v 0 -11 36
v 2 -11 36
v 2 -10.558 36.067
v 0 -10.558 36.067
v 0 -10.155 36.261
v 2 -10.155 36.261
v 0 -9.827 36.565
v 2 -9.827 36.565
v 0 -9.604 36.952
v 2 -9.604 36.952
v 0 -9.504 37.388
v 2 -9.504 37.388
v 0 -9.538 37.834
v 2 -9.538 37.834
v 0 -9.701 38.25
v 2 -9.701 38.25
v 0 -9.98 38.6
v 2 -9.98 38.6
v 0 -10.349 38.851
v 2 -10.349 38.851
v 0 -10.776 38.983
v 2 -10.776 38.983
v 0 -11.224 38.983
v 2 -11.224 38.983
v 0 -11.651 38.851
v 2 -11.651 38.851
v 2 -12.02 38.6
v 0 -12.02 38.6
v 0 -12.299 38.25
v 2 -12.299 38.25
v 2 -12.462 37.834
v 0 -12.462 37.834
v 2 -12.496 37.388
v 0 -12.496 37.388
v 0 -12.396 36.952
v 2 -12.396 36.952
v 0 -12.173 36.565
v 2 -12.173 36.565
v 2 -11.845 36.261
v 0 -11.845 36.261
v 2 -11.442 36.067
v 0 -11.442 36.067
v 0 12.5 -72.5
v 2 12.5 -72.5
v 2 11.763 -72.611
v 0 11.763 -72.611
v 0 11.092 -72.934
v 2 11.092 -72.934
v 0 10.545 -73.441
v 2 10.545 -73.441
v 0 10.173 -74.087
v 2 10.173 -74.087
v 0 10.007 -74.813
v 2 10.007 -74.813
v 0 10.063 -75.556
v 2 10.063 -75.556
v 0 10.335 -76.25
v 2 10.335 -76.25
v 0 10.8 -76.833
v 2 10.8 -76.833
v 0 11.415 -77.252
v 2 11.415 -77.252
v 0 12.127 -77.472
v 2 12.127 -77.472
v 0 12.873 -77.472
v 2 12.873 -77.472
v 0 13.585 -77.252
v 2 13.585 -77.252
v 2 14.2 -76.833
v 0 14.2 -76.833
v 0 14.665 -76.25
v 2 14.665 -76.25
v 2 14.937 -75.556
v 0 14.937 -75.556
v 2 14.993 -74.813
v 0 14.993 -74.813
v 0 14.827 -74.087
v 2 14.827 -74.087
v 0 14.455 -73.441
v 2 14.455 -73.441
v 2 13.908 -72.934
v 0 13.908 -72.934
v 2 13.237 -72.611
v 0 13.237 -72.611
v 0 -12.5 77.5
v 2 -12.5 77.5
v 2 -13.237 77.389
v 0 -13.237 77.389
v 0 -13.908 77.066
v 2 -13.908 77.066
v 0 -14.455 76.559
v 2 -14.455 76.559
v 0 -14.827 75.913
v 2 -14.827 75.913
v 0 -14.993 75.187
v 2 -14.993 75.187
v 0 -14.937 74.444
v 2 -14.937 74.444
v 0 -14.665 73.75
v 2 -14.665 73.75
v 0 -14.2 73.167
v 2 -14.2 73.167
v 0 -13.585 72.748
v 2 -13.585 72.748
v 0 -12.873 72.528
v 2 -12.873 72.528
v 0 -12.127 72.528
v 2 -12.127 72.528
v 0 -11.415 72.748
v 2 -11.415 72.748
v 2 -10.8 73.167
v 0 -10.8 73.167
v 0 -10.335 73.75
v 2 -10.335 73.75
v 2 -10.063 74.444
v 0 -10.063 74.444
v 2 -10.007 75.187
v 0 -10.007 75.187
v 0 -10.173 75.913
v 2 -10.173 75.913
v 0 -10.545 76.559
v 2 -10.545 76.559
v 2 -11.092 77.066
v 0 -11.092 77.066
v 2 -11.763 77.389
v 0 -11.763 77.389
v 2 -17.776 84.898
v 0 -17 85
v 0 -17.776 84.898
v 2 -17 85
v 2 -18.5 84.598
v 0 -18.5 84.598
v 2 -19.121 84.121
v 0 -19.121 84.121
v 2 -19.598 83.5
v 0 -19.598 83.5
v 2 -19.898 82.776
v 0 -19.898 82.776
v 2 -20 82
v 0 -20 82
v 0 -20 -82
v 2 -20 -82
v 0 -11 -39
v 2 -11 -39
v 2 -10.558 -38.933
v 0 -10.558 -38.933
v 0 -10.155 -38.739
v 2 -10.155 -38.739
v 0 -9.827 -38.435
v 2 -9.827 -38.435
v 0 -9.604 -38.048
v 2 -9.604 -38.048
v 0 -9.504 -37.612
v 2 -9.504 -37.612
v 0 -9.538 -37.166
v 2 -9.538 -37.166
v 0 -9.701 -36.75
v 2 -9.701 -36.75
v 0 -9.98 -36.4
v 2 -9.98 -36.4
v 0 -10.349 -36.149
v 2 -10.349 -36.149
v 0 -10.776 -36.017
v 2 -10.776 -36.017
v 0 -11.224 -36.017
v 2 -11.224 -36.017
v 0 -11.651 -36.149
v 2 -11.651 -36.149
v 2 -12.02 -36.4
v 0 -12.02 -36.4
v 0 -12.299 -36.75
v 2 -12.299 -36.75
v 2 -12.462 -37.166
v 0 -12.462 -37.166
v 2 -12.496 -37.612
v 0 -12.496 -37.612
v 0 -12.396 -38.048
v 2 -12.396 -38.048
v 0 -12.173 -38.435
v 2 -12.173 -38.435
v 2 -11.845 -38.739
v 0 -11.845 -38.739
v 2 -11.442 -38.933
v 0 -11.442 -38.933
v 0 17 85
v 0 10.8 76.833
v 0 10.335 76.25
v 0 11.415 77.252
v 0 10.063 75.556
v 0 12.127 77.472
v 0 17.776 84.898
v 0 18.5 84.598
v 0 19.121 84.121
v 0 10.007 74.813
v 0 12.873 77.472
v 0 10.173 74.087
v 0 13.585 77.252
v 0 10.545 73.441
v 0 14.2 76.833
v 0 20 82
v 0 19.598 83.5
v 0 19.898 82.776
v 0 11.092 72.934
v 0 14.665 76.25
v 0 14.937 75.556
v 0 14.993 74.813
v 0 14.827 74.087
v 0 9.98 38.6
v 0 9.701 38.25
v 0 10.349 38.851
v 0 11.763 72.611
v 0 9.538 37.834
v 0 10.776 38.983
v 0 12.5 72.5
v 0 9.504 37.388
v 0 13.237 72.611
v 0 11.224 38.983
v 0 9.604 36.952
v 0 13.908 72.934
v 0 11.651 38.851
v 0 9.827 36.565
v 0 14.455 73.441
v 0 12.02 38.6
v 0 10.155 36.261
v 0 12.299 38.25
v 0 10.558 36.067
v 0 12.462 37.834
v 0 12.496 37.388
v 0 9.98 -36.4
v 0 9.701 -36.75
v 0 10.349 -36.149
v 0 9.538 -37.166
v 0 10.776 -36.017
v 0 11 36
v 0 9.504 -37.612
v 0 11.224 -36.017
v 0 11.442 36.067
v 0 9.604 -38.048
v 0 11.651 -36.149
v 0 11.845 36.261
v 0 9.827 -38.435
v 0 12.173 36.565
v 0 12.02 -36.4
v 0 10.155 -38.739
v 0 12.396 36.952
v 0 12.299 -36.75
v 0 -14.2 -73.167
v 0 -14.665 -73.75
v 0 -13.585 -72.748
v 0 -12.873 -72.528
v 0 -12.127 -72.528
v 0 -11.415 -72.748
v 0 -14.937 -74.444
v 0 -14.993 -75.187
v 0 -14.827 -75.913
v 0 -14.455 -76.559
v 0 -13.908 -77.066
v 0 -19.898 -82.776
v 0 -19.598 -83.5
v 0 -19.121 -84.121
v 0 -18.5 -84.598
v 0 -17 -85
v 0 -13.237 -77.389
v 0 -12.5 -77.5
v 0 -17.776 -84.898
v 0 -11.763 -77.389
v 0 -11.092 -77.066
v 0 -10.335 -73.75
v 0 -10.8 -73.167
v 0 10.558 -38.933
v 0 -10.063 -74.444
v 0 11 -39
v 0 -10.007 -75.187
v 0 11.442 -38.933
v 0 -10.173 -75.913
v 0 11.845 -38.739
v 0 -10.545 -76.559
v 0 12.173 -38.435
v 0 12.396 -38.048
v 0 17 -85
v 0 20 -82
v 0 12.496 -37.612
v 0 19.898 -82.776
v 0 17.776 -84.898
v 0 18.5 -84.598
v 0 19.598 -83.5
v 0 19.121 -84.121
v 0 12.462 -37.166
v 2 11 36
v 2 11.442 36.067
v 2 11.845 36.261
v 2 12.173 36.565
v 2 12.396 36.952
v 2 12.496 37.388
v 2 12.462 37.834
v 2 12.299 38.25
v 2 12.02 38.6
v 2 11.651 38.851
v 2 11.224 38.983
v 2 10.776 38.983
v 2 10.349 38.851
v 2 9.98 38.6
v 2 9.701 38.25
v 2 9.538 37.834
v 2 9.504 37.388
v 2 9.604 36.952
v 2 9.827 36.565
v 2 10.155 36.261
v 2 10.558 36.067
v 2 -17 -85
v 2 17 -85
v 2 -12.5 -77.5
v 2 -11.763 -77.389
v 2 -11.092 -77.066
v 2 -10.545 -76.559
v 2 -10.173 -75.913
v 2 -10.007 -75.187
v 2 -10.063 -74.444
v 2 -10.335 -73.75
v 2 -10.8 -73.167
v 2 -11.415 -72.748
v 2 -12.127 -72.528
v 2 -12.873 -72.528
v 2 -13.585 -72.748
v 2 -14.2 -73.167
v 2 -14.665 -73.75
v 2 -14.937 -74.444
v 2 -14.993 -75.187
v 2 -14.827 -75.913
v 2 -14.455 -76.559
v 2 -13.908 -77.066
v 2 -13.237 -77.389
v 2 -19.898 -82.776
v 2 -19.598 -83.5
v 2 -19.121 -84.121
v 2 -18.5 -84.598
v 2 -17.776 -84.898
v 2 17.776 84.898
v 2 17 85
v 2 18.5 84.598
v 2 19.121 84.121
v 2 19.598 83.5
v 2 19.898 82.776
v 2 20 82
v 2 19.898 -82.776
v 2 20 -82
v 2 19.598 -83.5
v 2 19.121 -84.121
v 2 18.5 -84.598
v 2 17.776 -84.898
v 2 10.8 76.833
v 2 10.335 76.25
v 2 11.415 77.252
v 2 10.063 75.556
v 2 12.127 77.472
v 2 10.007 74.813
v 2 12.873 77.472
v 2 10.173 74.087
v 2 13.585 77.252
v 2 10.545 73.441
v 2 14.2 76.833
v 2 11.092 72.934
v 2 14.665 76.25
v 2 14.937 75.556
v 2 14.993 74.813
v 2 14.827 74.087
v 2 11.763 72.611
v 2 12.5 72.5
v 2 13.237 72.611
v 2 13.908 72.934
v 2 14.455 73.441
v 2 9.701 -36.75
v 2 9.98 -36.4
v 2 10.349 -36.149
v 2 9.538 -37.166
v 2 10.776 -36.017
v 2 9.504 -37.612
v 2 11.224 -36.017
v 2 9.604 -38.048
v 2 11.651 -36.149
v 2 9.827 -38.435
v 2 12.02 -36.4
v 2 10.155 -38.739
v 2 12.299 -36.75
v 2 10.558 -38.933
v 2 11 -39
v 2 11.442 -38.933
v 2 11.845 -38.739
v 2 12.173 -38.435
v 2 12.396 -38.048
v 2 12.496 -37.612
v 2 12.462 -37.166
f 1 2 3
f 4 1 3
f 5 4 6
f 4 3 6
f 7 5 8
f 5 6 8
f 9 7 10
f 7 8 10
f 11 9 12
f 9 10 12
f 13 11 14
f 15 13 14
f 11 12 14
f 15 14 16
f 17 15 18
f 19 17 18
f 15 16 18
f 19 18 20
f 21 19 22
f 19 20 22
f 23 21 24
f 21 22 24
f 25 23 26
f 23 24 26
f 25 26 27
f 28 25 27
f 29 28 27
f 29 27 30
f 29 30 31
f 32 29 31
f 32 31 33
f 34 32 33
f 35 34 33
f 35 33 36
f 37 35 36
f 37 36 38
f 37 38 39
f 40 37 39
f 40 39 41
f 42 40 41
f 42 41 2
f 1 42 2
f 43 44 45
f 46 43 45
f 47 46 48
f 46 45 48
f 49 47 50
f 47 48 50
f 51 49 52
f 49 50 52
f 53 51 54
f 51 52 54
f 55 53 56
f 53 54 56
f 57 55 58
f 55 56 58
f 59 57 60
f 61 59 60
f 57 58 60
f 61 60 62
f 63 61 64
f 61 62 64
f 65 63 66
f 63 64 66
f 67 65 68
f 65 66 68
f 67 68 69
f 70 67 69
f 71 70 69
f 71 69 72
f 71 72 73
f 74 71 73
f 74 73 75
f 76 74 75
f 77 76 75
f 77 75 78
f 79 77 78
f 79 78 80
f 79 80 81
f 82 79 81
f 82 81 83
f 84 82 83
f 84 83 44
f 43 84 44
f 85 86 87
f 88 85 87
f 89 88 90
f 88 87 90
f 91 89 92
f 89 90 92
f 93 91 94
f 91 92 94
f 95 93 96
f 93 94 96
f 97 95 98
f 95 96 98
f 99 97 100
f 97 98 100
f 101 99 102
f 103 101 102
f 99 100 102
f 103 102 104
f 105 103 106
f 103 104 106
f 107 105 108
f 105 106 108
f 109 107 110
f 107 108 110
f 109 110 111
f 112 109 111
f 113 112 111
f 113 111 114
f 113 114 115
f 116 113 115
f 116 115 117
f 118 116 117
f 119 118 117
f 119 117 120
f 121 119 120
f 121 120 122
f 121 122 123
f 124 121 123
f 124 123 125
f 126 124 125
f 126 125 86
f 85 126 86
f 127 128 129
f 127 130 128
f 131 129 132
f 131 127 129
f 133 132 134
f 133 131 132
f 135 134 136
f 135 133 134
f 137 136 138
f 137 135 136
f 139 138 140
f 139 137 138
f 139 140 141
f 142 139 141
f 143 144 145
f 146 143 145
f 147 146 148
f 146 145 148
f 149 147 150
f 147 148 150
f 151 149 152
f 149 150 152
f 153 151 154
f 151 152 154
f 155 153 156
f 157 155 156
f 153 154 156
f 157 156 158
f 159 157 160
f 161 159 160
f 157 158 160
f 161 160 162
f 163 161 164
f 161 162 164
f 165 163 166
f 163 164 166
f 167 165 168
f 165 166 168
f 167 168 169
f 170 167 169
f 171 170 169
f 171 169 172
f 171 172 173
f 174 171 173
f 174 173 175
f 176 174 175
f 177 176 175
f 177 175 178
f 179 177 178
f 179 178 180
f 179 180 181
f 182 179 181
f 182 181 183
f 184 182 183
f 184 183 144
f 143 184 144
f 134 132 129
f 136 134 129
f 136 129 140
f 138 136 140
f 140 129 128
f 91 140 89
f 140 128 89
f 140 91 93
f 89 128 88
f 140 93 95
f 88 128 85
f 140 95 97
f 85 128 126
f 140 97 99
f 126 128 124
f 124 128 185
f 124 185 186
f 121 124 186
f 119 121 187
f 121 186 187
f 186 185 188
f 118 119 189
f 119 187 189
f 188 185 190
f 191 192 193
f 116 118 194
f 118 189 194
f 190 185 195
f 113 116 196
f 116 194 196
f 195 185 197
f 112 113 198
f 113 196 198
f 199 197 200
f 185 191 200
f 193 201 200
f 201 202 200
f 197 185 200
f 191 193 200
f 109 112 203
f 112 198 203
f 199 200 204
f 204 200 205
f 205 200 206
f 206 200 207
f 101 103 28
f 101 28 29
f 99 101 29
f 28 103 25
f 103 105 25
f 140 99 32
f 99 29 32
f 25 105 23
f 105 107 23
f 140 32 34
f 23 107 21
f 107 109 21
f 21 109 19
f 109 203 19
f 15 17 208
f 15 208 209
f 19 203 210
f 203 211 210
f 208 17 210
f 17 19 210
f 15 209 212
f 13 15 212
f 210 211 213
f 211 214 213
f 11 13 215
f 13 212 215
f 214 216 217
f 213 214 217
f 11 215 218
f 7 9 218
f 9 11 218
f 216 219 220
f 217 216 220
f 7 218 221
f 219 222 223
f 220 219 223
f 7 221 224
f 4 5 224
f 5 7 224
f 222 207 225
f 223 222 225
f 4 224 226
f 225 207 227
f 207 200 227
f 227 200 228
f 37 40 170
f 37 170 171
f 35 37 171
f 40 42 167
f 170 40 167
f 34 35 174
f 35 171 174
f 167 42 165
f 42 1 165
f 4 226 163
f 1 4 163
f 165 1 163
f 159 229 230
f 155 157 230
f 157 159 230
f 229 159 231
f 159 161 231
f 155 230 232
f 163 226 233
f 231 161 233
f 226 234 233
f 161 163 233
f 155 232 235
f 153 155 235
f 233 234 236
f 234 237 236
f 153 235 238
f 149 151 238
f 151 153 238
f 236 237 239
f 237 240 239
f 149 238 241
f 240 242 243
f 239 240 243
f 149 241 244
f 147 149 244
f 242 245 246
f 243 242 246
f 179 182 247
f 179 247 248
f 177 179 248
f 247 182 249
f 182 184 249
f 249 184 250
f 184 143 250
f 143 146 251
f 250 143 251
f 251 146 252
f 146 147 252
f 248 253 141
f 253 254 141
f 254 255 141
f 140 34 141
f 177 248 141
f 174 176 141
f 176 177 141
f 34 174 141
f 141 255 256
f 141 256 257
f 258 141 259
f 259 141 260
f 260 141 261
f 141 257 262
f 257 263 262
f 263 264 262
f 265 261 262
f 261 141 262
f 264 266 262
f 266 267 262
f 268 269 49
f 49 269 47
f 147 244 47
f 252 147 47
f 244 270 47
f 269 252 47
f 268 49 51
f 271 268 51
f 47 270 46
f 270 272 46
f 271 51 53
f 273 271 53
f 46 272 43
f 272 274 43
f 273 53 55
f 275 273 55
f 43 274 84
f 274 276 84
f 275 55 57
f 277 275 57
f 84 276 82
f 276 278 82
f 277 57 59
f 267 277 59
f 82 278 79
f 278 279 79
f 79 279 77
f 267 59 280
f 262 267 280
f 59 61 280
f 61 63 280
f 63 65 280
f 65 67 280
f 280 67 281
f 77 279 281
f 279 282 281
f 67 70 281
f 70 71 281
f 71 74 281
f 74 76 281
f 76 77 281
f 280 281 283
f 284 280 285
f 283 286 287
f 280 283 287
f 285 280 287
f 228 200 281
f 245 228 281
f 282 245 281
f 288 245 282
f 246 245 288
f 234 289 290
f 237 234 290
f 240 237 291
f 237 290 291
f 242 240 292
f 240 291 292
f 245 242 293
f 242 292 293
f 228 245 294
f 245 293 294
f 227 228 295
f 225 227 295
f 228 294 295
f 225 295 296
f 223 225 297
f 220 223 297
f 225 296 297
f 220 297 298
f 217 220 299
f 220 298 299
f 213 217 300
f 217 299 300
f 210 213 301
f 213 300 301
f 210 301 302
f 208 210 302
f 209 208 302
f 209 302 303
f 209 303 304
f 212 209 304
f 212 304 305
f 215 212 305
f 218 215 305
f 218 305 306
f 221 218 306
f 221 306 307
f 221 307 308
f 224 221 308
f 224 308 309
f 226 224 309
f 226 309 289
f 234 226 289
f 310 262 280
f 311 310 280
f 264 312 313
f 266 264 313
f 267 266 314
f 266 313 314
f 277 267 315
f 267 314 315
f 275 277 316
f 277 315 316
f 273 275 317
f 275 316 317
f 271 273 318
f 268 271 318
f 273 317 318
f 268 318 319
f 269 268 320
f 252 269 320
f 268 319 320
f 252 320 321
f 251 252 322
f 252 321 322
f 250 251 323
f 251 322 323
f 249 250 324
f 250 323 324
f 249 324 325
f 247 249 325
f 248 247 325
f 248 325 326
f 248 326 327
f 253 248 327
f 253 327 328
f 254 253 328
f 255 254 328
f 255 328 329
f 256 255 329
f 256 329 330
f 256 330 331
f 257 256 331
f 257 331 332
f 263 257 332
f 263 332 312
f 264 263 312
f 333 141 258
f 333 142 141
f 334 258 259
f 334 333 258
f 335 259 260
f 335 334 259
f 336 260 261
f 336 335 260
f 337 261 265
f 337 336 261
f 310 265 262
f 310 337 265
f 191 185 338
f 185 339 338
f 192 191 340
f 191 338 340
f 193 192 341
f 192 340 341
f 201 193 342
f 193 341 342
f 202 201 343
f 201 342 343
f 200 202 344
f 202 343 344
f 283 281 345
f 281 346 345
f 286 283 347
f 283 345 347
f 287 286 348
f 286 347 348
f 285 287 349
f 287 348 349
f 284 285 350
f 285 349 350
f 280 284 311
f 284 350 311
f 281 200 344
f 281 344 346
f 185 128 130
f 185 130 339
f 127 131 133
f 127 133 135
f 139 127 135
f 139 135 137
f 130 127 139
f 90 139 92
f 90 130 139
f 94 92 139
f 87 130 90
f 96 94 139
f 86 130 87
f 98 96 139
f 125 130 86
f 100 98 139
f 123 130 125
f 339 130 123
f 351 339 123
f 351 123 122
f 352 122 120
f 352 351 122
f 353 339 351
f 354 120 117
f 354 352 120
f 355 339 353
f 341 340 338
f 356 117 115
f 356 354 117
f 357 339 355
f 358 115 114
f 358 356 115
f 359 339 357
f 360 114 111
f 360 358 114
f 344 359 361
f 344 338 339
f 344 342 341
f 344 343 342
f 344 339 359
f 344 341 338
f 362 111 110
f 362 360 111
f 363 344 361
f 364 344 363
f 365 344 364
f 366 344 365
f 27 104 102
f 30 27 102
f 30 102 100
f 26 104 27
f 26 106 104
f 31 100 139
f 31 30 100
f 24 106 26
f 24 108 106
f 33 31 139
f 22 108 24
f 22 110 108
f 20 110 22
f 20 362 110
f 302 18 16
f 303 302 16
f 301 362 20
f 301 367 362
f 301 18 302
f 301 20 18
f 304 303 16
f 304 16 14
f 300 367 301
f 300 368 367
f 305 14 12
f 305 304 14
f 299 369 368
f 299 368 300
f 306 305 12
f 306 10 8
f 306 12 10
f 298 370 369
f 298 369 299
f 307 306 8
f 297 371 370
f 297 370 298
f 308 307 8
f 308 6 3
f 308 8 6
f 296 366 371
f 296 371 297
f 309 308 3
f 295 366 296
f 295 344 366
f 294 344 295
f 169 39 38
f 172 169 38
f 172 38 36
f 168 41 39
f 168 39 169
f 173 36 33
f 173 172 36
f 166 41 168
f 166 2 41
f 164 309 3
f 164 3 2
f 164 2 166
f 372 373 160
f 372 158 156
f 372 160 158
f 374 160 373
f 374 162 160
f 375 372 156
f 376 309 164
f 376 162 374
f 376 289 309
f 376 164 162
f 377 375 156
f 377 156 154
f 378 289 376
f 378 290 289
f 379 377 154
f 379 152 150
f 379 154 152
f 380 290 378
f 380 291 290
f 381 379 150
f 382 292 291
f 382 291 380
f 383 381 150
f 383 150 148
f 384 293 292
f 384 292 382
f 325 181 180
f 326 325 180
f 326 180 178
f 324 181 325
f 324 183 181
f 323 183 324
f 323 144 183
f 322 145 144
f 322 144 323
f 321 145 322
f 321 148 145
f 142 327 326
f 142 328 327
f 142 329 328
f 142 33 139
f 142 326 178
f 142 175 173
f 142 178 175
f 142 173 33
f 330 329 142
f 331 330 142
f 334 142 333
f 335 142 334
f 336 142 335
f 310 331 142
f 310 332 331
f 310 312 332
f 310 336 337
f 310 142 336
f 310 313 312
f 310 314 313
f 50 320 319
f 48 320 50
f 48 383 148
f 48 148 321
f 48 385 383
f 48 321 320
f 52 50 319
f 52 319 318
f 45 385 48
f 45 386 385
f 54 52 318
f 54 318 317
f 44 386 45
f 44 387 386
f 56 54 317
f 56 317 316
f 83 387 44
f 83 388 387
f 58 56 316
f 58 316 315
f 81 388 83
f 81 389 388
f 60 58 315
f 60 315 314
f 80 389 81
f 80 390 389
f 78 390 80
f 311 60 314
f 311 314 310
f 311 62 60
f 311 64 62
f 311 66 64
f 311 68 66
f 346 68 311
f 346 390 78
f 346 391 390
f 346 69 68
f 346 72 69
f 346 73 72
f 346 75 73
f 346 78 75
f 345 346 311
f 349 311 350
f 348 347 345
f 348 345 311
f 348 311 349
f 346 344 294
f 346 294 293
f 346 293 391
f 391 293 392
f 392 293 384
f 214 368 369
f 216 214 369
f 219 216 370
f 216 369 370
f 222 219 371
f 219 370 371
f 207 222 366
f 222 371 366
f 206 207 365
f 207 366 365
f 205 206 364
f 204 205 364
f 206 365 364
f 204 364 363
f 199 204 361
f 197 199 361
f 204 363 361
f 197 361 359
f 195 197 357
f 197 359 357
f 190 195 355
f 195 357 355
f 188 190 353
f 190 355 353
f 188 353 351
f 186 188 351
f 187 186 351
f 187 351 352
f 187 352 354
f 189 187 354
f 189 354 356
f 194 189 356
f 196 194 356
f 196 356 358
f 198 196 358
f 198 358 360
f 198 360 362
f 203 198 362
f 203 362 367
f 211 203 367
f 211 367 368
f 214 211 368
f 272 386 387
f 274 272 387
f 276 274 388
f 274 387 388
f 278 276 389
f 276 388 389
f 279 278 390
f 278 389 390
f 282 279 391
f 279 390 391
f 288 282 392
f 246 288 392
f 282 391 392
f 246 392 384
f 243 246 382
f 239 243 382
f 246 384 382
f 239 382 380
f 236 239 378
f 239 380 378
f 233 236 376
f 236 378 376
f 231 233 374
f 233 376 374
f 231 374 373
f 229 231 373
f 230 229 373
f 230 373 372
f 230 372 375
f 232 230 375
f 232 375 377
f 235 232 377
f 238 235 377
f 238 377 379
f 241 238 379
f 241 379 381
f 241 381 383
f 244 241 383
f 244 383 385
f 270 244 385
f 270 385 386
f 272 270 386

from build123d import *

# Parameters (mm, degrees)
SKETCH_1_W          = 170
SKETCH_1_H          = 40
EXTRUDE_1_DEPTH     = 2
SKETCH_2_R          = 2.5
CUT_EXTRUDE_1_DEPTH = 88.344146913
SKETCH_3_R          = 1.5
CUT_EXTRUDE_2_DEPTH = 88.344146913
FILLET_1_R          = 3


with BuildPart() as part:
    # 草图1 → 凸台-拉伸1 (new body)
    with BuildSketch(Plane(origin=(0, 0, 0), x_dir=(0, 0, -1), z_dir=(1, 0, 0))):
        Rectangle(SKETCH_1_W, SKETCH_1_H)
    extrude(amount=EXTRUDE_1_DEPTH)

    # 草图2 → 切除-拉伸1 (cut, through all)
    with BuildSketch(Plane(origin=(2, 0, 0), x_dir=(0, 0, -1), z_dir=(1, 0, 0))):
        with Locations((-75, 12.5)):
            Circle(SKETCH_2_R)
        with Locations(Location((-75, -12.5, 0), (0, 0, 180))):
            Circle(SKETCH_2_R)
        with Locations((75, -12.5)):
            Circle(SKETCH_2_R)
        with Locations(Location((75, 12.5, 0), (0, 0, 180))):
            Circle(SKETCH_2_R)
    extrude(amount=-CUT_EXTRUDE_1_DEPTH, mode=Mode.SUBTRACT)

    # 草图3 → 切除-拉伸2 (cut, through all)
    with BuildSketch(Plane(origin=(2, 0, 0), x_dir=(0, 0, -1), z_dir=(1, 0, 0))):
        with Locations((-37.5, 11)):
            Circle(SKETCH_3_R)
        with Locations((-37.5, -11)):
            Circle(SKETCH_3_R)
        with Locations((37.5, 11)):
            Circle(SKETCH_3_R)
        with Locations((37.5, -11)):
            Circle(SKETCH_3_R)
    extrude(amount=-CUT_EXTRUDE_2_DEPTH, mode=Mode.SUBTRACT)

    # 圆角1
    fillet_1_edges = [part.edges().sort_by_distance(p)[0] for p in [
        (1, -20, -85),
        (1, -20, 85),
        (1, 20, 85),
        (1, 20, -85),
    ]]
    fillet(fillet_1_edges, radius=FILLET_1_R)


solid = part.part
